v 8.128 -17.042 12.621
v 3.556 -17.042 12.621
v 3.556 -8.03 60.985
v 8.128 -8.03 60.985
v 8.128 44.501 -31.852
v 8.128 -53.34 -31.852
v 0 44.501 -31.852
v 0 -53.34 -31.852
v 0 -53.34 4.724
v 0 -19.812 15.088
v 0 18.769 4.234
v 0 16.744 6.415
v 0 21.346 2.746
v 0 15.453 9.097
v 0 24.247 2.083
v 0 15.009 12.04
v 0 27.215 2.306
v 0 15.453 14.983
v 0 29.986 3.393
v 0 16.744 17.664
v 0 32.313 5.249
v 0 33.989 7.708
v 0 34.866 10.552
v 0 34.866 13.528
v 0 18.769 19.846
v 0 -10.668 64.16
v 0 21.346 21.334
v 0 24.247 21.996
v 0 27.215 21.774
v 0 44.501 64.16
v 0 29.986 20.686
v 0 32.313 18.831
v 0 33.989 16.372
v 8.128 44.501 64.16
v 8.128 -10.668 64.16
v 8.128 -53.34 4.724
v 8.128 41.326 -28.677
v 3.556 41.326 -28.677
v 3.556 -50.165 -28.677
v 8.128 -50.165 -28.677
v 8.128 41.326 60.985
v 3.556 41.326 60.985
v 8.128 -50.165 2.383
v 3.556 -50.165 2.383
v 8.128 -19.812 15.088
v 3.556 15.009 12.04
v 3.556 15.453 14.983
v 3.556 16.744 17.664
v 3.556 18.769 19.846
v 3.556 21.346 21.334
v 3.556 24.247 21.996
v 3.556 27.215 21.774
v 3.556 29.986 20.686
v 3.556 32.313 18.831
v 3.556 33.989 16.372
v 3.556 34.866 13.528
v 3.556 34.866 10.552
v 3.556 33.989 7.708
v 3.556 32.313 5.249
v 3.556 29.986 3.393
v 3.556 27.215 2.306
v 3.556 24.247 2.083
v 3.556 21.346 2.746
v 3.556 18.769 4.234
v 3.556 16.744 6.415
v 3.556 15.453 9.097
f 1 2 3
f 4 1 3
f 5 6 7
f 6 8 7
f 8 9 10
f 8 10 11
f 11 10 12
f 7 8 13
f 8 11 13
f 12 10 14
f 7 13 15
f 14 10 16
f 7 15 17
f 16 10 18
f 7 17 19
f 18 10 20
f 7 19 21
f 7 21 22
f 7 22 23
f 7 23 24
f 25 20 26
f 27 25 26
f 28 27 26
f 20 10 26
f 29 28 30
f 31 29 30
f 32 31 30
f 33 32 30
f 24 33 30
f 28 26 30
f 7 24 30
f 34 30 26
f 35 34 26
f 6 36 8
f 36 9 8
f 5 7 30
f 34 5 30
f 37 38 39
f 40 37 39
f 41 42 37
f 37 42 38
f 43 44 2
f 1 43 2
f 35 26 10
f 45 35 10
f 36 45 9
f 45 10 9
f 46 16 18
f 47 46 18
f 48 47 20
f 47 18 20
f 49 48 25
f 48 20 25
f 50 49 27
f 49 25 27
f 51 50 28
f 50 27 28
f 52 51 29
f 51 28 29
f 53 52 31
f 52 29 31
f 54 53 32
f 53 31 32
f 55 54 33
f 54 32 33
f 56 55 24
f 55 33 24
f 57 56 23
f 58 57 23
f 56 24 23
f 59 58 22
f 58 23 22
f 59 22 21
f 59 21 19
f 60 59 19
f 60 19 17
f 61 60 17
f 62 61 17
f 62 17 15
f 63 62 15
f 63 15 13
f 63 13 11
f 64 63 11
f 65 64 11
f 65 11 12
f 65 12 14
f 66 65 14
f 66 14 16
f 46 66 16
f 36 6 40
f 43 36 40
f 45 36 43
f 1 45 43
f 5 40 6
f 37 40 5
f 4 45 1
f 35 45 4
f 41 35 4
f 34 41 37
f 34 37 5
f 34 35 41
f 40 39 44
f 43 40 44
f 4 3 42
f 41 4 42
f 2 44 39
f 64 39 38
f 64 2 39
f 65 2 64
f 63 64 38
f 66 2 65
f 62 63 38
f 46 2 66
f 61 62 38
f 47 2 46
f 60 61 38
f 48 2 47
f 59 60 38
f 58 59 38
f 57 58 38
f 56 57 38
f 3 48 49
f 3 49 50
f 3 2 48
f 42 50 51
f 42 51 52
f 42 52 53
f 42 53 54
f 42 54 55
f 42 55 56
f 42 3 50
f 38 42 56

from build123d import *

# Parameters (mm, degrees)
F1_DEPTH = 3.556
F3_DEPTH = 4.572
F4_R     = 9.984236
F5_DEPTH = 25.4


with BuildPart() as f1:
    # F0 (on Right) → F1 (new body)
    with BuildSketch(Plane.YZ):
        Polygon((44.500802, -31.851601), (44.500802, 64.160399), (-10.668, 64.160399), (-19.812001, 15.0876), (-53.340003, 4.7244), (-53.340003, -31.851601), align=None)
    extrude(amount=F1_DEPTH)

    # F2 (on face) → F3 (join)
    with BuildSketch(Plane.YZ.offset(3.556)):
        Polygon((-10.668, 64.160399), (-19.812001, 15.0876), (-53.340003, 4.7244), (-53.340003, -31.851601), (44.500802, -31.851601), (44.500802, 64.160399), align=None)
        Polygon((-8.029966, 60.985399), (41.325802, 60.985399), (41.325802, -28.676601), (-50.165003, -28.676601), (-50.165003, 2.382557), (-17.042049, 12.620561), align=None, mode=Mode.SUBTRACT)
    extrude(amount=F3_DEPTH)

    # F4 (on face) → F5 (cut)
    with BuildSketch(Plane(origin=(0, 0, 0), x_dir=(0, -1, 0), z_dir=(-1, 0, 0))):
        with Locations((-24.9936, 12.0396)):
            Circle(F4_R)
    extrude(amount=-F5_DEPTH, mode=Mode.SUBTRACT)


solid = f1.part
